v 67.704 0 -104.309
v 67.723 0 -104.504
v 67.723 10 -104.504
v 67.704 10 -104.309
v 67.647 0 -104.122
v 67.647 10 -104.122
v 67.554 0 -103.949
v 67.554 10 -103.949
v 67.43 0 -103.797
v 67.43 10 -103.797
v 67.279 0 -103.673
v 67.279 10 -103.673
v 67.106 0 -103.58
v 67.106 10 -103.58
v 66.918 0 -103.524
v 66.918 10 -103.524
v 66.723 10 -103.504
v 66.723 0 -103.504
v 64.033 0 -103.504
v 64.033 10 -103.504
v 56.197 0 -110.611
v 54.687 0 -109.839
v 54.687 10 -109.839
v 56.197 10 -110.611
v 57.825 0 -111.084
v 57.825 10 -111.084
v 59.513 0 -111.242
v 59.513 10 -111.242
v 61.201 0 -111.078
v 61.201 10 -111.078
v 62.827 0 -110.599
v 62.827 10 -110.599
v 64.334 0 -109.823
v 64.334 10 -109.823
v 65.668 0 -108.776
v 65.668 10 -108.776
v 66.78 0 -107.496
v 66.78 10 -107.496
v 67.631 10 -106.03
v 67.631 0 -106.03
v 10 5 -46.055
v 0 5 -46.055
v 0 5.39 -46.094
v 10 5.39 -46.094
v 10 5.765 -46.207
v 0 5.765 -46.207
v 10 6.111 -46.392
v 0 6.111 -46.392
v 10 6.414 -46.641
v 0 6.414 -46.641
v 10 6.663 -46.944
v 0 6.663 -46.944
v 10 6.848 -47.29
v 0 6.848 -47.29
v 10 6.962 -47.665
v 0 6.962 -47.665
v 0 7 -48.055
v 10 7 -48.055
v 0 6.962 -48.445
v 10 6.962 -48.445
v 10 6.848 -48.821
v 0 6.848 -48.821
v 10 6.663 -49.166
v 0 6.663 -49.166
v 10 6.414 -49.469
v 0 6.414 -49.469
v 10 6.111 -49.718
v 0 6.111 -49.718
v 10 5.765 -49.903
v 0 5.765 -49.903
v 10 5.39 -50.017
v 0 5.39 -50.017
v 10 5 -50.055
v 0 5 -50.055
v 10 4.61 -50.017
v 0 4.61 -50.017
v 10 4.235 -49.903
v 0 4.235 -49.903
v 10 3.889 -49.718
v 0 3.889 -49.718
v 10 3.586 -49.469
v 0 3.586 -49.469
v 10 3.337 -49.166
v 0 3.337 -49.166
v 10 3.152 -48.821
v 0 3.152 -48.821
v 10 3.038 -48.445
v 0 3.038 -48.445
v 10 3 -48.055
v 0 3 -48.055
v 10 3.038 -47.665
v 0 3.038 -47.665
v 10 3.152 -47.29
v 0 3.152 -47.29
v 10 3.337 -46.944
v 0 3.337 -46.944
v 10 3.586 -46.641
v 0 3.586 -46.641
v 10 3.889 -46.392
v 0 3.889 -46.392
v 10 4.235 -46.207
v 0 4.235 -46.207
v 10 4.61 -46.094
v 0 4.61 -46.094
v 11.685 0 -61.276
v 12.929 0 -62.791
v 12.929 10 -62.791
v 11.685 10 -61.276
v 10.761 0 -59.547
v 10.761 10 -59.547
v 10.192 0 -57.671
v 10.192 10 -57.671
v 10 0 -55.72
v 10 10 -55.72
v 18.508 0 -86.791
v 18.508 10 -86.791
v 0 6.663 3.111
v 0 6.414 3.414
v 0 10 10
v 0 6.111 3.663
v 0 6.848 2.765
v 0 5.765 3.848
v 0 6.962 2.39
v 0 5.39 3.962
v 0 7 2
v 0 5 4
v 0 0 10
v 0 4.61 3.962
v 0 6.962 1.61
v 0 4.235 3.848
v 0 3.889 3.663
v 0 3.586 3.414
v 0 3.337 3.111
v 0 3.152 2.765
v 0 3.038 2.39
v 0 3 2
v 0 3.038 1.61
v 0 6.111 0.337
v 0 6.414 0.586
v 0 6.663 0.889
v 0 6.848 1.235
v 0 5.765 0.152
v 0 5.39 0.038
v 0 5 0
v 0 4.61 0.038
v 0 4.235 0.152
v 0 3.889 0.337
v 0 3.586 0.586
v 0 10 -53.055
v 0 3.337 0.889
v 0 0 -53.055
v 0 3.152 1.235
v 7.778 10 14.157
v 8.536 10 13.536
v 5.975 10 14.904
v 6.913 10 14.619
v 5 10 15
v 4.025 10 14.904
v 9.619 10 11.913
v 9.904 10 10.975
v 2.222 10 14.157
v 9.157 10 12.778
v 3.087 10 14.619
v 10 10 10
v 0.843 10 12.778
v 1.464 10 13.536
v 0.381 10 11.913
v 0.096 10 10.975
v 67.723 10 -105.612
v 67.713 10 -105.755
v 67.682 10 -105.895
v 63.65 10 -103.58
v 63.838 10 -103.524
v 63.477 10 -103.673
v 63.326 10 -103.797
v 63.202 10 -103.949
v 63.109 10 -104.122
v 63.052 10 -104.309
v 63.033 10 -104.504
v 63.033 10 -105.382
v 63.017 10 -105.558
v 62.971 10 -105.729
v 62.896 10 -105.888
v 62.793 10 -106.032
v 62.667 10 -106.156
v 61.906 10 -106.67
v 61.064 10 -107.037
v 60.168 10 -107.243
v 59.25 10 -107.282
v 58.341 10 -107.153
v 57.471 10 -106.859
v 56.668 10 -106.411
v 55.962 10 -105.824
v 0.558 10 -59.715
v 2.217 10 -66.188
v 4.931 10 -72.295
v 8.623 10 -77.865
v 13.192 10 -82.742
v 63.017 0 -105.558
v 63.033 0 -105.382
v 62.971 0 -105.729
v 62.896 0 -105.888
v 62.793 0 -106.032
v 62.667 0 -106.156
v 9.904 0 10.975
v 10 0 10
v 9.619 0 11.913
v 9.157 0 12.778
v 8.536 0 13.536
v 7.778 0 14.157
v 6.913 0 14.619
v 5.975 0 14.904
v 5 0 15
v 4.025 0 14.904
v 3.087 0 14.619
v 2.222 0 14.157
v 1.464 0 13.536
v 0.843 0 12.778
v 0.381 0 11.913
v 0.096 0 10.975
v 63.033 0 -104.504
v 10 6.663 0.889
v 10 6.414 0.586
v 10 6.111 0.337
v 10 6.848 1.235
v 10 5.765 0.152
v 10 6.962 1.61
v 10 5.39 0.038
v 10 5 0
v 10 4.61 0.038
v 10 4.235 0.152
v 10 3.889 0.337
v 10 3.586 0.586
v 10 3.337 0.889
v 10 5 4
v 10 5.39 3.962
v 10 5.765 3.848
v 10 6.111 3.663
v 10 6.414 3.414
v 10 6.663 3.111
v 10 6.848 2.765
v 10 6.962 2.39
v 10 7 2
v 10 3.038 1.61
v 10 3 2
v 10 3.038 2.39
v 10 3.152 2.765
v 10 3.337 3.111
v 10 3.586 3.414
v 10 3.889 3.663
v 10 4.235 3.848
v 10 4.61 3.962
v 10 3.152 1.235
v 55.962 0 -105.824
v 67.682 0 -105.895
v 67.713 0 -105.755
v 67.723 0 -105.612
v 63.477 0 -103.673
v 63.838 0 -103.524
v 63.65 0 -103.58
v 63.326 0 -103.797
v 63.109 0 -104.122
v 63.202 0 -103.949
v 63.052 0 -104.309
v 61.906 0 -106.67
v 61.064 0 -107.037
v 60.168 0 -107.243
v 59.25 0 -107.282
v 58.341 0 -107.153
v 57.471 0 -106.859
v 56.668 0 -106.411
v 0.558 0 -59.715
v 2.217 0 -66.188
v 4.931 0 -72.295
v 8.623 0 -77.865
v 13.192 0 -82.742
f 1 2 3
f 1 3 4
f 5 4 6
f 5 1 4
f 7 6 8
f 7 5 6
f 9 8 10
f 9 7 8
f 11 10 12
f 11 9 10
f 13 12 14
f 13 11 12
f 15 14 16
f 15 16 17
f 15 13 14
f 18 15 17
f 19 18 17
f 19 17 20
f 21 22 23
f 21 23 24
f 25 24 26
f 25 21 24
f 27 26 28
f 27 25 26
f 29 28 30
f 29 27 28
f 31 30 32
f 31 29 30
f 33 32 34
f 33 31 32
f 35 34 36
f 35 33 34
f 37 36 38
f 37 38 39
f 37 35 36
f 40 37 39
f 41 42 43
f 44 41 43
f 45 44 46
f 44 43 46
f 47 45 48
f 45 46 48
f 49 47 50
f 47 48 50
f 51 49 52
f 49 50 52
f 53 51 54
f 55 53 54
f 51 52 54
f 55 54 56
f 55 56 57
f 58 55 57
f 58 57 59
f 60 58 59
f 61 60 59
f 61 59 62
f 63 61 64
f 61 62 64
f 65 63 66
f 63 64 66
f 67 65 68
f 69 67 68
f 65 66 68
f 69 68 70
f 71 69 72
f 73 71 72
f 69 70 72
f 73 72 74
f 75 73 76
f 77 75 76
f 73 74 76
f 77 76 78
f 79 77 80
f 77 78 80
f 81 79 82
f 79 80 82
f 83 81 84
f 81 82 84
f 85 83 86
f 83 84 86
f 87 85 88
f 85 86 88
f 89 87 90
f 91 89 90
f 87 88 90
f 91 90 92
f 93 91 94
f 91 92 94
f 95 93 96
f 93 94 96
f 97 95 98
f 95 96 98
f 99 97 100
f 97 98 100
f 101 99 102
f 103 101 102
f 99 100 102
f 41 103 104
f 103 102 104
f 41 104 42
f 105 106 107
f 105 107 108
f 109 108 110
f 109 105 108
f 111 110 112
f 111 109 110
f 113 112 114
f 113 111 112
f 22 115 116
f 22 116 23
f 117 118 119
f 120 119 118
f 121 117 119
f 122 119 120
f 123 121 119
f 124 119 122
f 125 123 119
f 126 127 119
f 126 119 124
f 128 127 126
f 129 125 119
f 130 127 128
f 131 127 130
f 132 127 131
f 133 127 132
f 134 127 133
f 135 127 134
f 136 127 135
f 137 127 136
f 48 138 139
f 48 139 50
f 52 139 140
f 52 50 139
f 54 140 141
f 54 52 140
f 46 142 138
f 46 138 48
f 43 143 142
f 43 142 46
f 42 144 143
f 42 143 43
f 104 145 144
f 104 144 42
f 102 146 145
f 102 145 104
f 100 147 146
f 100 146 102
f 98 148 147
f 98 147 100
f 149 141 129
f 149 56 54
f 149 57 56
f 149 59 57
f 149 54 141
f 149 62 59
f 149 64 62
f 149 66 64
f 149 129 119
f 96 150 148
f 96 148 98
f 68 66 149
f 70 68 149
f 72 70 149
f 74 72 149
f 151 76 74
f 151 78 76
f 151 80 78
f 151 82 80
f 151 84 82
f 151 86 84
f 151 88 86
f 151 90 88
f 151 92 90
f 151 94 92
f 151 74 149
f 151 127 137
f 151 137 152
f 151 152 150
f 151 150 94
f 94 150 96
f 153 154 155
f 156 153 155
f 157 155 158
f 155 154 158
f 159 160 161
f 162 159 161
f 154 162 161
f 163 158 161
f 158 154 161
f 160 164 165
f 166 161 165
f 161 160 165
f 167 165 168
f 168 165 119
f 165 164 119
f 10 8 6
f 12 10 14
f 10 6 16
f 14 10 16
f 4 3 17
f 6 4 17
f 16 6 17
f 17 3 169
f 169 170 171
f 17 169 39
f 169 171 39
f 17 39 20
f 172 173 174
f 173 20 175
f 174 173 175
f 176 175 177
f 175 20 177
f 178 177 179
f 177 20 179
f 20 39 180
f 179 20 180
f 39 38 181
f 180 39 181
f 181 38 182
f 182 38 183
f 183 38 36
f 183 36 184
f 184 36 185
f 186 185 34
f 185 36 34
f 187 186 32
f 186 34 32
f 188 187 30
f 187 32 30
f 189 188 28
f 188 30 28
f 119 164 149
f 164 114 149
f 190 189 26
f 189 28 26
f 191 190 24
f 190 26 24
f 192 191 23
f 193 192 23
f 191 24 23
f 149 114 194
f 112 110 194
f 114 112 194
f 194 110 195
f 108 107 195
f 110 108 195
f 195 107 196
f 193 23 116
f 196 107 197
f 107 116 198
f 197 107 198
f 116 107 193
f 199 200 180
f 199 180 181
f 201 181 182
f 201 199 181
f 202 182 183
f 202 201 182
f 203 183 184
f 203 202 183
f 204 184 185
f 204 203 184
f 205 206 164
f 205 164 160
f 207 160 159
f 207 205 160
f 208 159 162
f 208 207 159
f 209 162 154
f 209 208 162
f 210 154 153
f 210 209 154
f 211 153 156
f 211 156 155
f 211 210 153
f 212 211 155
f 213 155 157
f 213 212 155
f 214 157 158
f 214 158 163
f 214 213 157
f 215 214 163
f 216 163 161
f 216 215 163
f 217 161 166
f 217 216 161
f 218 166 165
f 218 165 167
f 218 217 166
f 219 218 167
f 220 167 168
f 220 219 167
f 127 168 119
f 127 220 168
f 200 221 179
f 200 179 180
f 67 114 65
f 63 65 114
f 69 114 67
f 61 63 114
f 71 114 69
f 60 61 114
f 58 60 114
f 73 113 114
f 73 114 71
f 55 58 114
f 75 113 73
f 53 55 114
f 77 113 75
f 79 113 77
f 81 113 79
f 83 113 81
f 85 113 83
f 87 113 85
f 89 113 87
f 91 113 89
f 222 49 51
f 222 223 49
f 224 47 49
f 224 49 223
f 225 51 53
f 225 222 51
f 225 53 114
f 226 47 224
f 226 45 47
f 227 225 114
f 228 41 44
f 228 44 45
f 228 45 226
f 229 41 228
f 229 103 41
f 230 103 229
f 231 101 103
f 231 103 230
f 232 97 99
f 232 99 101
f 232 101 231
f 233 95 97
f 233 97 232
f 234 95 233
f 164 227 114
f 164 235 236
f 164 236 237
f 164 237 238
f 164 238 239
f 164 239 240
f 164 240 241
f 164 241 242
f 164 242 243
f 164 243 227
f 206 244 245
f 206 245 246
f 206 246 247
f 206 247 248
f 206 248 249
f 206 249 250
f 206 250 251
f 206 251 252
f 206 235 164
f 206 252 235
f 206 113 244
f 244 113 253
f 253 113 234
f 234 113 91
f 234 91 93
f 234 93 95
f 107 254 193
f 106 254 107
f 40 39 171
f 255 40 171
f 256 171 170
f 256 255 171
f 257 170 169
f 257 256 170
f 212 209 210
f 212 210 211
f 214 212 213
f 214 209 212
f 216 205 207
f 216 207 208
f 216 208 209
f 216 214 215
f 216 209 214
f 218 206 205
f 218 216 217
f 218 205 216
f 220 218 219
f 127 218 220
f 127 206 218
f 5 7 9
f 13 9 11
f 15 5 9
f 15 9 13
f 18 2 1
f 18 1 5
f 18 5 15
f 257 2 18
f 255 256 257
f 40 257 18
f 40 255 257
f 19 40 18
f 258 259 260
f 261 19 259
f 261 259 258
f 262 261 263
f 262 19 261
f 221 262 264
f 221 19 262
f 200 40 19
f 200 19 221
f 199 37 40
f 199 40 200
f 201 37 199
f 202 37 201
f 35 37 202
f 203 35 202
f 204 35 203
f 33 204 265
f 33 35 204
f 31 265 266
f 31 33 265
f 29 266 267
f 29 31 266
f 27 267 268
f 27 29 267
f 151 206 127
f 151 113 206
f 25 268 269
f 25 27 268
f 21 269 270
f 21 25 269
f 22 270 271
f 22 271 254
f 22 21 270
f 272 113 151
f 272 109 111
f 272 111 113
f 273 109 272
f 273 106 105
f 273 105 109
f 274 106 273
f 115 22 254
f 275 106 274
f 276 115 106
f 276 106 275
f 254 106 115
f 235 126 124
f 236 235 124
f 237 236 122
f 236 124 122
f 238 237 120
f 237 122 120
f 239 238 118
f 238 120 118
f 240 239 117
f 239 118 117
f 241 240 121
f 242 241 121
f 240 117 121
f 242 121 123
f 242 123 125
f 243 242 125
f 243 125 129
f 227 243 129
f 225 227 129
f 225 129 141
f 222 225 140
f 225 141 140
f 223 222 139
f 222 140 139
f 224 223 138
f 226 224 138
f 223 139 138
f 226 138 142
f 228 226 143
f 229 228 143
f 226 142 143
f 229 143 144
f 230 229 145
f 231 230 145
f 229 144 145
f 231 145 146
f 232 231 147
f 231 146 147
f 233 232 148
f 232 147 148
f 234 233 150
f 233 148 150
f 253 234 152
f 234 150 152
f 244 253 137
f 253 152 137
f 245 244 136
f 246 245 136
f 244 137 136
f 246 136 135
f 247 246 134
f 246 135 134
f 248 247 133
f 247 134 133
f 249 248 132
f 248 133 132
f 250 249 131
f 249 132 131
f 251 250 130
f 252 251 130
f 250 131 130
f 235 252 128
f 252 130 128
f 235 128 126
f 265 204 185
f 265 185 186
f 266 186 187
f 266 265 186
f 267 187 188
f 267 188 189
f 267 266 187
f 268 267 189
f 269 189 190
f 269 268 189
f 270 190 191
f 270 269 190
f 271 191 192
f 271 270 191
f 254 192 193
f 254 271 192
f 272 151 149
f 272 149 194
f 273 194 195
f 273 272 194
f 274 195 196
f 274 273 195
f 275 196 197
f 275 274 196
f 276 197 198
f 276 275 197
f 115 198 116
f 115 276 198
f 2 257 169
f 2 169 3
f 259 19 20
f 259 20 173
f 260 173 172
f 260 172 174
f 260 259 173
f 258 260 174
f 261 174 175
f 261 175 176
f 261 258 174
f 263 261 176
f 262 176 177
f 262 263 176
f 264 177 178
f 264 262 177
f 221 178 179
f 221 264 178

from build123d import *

# Parameters (mm, degrees)
BOSS_EXTRUDE1_DEPTH = 10
SKETCH4_R           = 2
CUT_EXTRUDE3_DEPTH  = 10


with BuildPart() as part:
    # Sketch1 → Boss-Extrude1 (new body)
    with BuildSketch(Plane(origin=(0, 0, 0), x_dir=(1, 0, 0), z_dir=(0, 1, 0))):
        with BuildLine():
            Line((0, 0), (0, 53.055248535))
            ThreePointArc((0, 53.055248535), (4.930929772, 72.294799292), (18.508015666, 86.790906367))
            Line((18.508015666, 86.790906367), (54.686952948, 109.839431377))
            ThreePointArc((54.686952948, 109.839431377), (62.025319105, 110.877302623), (67.631481029, 106.029649267))
            ThreePointArc((67.631481029, 106.029649267), (67.699832136, 105.82566515), (67.722972833, 105.611782234))
            Line((67.722972833, 105.611782234), (67.722972833, 104.504374958))
            ThreePointArc((67.722972833, 104.504374958), (67.430079614, 103.797268177), (66.722972833, 103.504374958))
            Line((66.722972833, 103.504374958), (64.033008589, 103.504374958))
            ThreePointArc((64.033008589, 103.504374958), (63.325901808, 103.797268177), (63.033008589, 104.504374958))
            Line((63.033008589, 104.504374958), (63.033008589, 105.382139034))
            ThreePointArc((63.033008589, 105.382139034), (62.936856883, 105.809992118), (62.666892065, 106.155567594))
            ThreePointArc((62.666892065, 106.155567594), (59.250489983, 107.282320922), (55.961940777, 105.823958698))
            Line((55.961940777, 105.823958698), (12.928932188, 62.790950109))
            ThreePointArc((12.928932188, 62.790950109), (10.761204675, 59.546716621), (10, 55.719882297))
            Line((10, 55.719882297), (10, -0.137982079))
            Line((10, -0.137982079), (10, -10))
            ThreePointArc((10, -10), (5, -15), (0, -10))
            Line((0, -10), (0, 0))
        make_face()
    extrude(amount=BOSS_EXTRUDE1_DEPTH)

    # Sketch4 → Cut-Extrude3 (cut)
    with BuildSketch(Plane.ZY):
        with Locations((-48.055248535, 5)):
            Circle(SKETCH4_R)
        with Locations((2, 5)):
            Circle(SKETCH4_R)
    extrude(amount=-CUT_EXTRUDE3_DEPTH, mode=Mode.SUBTRACT)


solid = part.part
